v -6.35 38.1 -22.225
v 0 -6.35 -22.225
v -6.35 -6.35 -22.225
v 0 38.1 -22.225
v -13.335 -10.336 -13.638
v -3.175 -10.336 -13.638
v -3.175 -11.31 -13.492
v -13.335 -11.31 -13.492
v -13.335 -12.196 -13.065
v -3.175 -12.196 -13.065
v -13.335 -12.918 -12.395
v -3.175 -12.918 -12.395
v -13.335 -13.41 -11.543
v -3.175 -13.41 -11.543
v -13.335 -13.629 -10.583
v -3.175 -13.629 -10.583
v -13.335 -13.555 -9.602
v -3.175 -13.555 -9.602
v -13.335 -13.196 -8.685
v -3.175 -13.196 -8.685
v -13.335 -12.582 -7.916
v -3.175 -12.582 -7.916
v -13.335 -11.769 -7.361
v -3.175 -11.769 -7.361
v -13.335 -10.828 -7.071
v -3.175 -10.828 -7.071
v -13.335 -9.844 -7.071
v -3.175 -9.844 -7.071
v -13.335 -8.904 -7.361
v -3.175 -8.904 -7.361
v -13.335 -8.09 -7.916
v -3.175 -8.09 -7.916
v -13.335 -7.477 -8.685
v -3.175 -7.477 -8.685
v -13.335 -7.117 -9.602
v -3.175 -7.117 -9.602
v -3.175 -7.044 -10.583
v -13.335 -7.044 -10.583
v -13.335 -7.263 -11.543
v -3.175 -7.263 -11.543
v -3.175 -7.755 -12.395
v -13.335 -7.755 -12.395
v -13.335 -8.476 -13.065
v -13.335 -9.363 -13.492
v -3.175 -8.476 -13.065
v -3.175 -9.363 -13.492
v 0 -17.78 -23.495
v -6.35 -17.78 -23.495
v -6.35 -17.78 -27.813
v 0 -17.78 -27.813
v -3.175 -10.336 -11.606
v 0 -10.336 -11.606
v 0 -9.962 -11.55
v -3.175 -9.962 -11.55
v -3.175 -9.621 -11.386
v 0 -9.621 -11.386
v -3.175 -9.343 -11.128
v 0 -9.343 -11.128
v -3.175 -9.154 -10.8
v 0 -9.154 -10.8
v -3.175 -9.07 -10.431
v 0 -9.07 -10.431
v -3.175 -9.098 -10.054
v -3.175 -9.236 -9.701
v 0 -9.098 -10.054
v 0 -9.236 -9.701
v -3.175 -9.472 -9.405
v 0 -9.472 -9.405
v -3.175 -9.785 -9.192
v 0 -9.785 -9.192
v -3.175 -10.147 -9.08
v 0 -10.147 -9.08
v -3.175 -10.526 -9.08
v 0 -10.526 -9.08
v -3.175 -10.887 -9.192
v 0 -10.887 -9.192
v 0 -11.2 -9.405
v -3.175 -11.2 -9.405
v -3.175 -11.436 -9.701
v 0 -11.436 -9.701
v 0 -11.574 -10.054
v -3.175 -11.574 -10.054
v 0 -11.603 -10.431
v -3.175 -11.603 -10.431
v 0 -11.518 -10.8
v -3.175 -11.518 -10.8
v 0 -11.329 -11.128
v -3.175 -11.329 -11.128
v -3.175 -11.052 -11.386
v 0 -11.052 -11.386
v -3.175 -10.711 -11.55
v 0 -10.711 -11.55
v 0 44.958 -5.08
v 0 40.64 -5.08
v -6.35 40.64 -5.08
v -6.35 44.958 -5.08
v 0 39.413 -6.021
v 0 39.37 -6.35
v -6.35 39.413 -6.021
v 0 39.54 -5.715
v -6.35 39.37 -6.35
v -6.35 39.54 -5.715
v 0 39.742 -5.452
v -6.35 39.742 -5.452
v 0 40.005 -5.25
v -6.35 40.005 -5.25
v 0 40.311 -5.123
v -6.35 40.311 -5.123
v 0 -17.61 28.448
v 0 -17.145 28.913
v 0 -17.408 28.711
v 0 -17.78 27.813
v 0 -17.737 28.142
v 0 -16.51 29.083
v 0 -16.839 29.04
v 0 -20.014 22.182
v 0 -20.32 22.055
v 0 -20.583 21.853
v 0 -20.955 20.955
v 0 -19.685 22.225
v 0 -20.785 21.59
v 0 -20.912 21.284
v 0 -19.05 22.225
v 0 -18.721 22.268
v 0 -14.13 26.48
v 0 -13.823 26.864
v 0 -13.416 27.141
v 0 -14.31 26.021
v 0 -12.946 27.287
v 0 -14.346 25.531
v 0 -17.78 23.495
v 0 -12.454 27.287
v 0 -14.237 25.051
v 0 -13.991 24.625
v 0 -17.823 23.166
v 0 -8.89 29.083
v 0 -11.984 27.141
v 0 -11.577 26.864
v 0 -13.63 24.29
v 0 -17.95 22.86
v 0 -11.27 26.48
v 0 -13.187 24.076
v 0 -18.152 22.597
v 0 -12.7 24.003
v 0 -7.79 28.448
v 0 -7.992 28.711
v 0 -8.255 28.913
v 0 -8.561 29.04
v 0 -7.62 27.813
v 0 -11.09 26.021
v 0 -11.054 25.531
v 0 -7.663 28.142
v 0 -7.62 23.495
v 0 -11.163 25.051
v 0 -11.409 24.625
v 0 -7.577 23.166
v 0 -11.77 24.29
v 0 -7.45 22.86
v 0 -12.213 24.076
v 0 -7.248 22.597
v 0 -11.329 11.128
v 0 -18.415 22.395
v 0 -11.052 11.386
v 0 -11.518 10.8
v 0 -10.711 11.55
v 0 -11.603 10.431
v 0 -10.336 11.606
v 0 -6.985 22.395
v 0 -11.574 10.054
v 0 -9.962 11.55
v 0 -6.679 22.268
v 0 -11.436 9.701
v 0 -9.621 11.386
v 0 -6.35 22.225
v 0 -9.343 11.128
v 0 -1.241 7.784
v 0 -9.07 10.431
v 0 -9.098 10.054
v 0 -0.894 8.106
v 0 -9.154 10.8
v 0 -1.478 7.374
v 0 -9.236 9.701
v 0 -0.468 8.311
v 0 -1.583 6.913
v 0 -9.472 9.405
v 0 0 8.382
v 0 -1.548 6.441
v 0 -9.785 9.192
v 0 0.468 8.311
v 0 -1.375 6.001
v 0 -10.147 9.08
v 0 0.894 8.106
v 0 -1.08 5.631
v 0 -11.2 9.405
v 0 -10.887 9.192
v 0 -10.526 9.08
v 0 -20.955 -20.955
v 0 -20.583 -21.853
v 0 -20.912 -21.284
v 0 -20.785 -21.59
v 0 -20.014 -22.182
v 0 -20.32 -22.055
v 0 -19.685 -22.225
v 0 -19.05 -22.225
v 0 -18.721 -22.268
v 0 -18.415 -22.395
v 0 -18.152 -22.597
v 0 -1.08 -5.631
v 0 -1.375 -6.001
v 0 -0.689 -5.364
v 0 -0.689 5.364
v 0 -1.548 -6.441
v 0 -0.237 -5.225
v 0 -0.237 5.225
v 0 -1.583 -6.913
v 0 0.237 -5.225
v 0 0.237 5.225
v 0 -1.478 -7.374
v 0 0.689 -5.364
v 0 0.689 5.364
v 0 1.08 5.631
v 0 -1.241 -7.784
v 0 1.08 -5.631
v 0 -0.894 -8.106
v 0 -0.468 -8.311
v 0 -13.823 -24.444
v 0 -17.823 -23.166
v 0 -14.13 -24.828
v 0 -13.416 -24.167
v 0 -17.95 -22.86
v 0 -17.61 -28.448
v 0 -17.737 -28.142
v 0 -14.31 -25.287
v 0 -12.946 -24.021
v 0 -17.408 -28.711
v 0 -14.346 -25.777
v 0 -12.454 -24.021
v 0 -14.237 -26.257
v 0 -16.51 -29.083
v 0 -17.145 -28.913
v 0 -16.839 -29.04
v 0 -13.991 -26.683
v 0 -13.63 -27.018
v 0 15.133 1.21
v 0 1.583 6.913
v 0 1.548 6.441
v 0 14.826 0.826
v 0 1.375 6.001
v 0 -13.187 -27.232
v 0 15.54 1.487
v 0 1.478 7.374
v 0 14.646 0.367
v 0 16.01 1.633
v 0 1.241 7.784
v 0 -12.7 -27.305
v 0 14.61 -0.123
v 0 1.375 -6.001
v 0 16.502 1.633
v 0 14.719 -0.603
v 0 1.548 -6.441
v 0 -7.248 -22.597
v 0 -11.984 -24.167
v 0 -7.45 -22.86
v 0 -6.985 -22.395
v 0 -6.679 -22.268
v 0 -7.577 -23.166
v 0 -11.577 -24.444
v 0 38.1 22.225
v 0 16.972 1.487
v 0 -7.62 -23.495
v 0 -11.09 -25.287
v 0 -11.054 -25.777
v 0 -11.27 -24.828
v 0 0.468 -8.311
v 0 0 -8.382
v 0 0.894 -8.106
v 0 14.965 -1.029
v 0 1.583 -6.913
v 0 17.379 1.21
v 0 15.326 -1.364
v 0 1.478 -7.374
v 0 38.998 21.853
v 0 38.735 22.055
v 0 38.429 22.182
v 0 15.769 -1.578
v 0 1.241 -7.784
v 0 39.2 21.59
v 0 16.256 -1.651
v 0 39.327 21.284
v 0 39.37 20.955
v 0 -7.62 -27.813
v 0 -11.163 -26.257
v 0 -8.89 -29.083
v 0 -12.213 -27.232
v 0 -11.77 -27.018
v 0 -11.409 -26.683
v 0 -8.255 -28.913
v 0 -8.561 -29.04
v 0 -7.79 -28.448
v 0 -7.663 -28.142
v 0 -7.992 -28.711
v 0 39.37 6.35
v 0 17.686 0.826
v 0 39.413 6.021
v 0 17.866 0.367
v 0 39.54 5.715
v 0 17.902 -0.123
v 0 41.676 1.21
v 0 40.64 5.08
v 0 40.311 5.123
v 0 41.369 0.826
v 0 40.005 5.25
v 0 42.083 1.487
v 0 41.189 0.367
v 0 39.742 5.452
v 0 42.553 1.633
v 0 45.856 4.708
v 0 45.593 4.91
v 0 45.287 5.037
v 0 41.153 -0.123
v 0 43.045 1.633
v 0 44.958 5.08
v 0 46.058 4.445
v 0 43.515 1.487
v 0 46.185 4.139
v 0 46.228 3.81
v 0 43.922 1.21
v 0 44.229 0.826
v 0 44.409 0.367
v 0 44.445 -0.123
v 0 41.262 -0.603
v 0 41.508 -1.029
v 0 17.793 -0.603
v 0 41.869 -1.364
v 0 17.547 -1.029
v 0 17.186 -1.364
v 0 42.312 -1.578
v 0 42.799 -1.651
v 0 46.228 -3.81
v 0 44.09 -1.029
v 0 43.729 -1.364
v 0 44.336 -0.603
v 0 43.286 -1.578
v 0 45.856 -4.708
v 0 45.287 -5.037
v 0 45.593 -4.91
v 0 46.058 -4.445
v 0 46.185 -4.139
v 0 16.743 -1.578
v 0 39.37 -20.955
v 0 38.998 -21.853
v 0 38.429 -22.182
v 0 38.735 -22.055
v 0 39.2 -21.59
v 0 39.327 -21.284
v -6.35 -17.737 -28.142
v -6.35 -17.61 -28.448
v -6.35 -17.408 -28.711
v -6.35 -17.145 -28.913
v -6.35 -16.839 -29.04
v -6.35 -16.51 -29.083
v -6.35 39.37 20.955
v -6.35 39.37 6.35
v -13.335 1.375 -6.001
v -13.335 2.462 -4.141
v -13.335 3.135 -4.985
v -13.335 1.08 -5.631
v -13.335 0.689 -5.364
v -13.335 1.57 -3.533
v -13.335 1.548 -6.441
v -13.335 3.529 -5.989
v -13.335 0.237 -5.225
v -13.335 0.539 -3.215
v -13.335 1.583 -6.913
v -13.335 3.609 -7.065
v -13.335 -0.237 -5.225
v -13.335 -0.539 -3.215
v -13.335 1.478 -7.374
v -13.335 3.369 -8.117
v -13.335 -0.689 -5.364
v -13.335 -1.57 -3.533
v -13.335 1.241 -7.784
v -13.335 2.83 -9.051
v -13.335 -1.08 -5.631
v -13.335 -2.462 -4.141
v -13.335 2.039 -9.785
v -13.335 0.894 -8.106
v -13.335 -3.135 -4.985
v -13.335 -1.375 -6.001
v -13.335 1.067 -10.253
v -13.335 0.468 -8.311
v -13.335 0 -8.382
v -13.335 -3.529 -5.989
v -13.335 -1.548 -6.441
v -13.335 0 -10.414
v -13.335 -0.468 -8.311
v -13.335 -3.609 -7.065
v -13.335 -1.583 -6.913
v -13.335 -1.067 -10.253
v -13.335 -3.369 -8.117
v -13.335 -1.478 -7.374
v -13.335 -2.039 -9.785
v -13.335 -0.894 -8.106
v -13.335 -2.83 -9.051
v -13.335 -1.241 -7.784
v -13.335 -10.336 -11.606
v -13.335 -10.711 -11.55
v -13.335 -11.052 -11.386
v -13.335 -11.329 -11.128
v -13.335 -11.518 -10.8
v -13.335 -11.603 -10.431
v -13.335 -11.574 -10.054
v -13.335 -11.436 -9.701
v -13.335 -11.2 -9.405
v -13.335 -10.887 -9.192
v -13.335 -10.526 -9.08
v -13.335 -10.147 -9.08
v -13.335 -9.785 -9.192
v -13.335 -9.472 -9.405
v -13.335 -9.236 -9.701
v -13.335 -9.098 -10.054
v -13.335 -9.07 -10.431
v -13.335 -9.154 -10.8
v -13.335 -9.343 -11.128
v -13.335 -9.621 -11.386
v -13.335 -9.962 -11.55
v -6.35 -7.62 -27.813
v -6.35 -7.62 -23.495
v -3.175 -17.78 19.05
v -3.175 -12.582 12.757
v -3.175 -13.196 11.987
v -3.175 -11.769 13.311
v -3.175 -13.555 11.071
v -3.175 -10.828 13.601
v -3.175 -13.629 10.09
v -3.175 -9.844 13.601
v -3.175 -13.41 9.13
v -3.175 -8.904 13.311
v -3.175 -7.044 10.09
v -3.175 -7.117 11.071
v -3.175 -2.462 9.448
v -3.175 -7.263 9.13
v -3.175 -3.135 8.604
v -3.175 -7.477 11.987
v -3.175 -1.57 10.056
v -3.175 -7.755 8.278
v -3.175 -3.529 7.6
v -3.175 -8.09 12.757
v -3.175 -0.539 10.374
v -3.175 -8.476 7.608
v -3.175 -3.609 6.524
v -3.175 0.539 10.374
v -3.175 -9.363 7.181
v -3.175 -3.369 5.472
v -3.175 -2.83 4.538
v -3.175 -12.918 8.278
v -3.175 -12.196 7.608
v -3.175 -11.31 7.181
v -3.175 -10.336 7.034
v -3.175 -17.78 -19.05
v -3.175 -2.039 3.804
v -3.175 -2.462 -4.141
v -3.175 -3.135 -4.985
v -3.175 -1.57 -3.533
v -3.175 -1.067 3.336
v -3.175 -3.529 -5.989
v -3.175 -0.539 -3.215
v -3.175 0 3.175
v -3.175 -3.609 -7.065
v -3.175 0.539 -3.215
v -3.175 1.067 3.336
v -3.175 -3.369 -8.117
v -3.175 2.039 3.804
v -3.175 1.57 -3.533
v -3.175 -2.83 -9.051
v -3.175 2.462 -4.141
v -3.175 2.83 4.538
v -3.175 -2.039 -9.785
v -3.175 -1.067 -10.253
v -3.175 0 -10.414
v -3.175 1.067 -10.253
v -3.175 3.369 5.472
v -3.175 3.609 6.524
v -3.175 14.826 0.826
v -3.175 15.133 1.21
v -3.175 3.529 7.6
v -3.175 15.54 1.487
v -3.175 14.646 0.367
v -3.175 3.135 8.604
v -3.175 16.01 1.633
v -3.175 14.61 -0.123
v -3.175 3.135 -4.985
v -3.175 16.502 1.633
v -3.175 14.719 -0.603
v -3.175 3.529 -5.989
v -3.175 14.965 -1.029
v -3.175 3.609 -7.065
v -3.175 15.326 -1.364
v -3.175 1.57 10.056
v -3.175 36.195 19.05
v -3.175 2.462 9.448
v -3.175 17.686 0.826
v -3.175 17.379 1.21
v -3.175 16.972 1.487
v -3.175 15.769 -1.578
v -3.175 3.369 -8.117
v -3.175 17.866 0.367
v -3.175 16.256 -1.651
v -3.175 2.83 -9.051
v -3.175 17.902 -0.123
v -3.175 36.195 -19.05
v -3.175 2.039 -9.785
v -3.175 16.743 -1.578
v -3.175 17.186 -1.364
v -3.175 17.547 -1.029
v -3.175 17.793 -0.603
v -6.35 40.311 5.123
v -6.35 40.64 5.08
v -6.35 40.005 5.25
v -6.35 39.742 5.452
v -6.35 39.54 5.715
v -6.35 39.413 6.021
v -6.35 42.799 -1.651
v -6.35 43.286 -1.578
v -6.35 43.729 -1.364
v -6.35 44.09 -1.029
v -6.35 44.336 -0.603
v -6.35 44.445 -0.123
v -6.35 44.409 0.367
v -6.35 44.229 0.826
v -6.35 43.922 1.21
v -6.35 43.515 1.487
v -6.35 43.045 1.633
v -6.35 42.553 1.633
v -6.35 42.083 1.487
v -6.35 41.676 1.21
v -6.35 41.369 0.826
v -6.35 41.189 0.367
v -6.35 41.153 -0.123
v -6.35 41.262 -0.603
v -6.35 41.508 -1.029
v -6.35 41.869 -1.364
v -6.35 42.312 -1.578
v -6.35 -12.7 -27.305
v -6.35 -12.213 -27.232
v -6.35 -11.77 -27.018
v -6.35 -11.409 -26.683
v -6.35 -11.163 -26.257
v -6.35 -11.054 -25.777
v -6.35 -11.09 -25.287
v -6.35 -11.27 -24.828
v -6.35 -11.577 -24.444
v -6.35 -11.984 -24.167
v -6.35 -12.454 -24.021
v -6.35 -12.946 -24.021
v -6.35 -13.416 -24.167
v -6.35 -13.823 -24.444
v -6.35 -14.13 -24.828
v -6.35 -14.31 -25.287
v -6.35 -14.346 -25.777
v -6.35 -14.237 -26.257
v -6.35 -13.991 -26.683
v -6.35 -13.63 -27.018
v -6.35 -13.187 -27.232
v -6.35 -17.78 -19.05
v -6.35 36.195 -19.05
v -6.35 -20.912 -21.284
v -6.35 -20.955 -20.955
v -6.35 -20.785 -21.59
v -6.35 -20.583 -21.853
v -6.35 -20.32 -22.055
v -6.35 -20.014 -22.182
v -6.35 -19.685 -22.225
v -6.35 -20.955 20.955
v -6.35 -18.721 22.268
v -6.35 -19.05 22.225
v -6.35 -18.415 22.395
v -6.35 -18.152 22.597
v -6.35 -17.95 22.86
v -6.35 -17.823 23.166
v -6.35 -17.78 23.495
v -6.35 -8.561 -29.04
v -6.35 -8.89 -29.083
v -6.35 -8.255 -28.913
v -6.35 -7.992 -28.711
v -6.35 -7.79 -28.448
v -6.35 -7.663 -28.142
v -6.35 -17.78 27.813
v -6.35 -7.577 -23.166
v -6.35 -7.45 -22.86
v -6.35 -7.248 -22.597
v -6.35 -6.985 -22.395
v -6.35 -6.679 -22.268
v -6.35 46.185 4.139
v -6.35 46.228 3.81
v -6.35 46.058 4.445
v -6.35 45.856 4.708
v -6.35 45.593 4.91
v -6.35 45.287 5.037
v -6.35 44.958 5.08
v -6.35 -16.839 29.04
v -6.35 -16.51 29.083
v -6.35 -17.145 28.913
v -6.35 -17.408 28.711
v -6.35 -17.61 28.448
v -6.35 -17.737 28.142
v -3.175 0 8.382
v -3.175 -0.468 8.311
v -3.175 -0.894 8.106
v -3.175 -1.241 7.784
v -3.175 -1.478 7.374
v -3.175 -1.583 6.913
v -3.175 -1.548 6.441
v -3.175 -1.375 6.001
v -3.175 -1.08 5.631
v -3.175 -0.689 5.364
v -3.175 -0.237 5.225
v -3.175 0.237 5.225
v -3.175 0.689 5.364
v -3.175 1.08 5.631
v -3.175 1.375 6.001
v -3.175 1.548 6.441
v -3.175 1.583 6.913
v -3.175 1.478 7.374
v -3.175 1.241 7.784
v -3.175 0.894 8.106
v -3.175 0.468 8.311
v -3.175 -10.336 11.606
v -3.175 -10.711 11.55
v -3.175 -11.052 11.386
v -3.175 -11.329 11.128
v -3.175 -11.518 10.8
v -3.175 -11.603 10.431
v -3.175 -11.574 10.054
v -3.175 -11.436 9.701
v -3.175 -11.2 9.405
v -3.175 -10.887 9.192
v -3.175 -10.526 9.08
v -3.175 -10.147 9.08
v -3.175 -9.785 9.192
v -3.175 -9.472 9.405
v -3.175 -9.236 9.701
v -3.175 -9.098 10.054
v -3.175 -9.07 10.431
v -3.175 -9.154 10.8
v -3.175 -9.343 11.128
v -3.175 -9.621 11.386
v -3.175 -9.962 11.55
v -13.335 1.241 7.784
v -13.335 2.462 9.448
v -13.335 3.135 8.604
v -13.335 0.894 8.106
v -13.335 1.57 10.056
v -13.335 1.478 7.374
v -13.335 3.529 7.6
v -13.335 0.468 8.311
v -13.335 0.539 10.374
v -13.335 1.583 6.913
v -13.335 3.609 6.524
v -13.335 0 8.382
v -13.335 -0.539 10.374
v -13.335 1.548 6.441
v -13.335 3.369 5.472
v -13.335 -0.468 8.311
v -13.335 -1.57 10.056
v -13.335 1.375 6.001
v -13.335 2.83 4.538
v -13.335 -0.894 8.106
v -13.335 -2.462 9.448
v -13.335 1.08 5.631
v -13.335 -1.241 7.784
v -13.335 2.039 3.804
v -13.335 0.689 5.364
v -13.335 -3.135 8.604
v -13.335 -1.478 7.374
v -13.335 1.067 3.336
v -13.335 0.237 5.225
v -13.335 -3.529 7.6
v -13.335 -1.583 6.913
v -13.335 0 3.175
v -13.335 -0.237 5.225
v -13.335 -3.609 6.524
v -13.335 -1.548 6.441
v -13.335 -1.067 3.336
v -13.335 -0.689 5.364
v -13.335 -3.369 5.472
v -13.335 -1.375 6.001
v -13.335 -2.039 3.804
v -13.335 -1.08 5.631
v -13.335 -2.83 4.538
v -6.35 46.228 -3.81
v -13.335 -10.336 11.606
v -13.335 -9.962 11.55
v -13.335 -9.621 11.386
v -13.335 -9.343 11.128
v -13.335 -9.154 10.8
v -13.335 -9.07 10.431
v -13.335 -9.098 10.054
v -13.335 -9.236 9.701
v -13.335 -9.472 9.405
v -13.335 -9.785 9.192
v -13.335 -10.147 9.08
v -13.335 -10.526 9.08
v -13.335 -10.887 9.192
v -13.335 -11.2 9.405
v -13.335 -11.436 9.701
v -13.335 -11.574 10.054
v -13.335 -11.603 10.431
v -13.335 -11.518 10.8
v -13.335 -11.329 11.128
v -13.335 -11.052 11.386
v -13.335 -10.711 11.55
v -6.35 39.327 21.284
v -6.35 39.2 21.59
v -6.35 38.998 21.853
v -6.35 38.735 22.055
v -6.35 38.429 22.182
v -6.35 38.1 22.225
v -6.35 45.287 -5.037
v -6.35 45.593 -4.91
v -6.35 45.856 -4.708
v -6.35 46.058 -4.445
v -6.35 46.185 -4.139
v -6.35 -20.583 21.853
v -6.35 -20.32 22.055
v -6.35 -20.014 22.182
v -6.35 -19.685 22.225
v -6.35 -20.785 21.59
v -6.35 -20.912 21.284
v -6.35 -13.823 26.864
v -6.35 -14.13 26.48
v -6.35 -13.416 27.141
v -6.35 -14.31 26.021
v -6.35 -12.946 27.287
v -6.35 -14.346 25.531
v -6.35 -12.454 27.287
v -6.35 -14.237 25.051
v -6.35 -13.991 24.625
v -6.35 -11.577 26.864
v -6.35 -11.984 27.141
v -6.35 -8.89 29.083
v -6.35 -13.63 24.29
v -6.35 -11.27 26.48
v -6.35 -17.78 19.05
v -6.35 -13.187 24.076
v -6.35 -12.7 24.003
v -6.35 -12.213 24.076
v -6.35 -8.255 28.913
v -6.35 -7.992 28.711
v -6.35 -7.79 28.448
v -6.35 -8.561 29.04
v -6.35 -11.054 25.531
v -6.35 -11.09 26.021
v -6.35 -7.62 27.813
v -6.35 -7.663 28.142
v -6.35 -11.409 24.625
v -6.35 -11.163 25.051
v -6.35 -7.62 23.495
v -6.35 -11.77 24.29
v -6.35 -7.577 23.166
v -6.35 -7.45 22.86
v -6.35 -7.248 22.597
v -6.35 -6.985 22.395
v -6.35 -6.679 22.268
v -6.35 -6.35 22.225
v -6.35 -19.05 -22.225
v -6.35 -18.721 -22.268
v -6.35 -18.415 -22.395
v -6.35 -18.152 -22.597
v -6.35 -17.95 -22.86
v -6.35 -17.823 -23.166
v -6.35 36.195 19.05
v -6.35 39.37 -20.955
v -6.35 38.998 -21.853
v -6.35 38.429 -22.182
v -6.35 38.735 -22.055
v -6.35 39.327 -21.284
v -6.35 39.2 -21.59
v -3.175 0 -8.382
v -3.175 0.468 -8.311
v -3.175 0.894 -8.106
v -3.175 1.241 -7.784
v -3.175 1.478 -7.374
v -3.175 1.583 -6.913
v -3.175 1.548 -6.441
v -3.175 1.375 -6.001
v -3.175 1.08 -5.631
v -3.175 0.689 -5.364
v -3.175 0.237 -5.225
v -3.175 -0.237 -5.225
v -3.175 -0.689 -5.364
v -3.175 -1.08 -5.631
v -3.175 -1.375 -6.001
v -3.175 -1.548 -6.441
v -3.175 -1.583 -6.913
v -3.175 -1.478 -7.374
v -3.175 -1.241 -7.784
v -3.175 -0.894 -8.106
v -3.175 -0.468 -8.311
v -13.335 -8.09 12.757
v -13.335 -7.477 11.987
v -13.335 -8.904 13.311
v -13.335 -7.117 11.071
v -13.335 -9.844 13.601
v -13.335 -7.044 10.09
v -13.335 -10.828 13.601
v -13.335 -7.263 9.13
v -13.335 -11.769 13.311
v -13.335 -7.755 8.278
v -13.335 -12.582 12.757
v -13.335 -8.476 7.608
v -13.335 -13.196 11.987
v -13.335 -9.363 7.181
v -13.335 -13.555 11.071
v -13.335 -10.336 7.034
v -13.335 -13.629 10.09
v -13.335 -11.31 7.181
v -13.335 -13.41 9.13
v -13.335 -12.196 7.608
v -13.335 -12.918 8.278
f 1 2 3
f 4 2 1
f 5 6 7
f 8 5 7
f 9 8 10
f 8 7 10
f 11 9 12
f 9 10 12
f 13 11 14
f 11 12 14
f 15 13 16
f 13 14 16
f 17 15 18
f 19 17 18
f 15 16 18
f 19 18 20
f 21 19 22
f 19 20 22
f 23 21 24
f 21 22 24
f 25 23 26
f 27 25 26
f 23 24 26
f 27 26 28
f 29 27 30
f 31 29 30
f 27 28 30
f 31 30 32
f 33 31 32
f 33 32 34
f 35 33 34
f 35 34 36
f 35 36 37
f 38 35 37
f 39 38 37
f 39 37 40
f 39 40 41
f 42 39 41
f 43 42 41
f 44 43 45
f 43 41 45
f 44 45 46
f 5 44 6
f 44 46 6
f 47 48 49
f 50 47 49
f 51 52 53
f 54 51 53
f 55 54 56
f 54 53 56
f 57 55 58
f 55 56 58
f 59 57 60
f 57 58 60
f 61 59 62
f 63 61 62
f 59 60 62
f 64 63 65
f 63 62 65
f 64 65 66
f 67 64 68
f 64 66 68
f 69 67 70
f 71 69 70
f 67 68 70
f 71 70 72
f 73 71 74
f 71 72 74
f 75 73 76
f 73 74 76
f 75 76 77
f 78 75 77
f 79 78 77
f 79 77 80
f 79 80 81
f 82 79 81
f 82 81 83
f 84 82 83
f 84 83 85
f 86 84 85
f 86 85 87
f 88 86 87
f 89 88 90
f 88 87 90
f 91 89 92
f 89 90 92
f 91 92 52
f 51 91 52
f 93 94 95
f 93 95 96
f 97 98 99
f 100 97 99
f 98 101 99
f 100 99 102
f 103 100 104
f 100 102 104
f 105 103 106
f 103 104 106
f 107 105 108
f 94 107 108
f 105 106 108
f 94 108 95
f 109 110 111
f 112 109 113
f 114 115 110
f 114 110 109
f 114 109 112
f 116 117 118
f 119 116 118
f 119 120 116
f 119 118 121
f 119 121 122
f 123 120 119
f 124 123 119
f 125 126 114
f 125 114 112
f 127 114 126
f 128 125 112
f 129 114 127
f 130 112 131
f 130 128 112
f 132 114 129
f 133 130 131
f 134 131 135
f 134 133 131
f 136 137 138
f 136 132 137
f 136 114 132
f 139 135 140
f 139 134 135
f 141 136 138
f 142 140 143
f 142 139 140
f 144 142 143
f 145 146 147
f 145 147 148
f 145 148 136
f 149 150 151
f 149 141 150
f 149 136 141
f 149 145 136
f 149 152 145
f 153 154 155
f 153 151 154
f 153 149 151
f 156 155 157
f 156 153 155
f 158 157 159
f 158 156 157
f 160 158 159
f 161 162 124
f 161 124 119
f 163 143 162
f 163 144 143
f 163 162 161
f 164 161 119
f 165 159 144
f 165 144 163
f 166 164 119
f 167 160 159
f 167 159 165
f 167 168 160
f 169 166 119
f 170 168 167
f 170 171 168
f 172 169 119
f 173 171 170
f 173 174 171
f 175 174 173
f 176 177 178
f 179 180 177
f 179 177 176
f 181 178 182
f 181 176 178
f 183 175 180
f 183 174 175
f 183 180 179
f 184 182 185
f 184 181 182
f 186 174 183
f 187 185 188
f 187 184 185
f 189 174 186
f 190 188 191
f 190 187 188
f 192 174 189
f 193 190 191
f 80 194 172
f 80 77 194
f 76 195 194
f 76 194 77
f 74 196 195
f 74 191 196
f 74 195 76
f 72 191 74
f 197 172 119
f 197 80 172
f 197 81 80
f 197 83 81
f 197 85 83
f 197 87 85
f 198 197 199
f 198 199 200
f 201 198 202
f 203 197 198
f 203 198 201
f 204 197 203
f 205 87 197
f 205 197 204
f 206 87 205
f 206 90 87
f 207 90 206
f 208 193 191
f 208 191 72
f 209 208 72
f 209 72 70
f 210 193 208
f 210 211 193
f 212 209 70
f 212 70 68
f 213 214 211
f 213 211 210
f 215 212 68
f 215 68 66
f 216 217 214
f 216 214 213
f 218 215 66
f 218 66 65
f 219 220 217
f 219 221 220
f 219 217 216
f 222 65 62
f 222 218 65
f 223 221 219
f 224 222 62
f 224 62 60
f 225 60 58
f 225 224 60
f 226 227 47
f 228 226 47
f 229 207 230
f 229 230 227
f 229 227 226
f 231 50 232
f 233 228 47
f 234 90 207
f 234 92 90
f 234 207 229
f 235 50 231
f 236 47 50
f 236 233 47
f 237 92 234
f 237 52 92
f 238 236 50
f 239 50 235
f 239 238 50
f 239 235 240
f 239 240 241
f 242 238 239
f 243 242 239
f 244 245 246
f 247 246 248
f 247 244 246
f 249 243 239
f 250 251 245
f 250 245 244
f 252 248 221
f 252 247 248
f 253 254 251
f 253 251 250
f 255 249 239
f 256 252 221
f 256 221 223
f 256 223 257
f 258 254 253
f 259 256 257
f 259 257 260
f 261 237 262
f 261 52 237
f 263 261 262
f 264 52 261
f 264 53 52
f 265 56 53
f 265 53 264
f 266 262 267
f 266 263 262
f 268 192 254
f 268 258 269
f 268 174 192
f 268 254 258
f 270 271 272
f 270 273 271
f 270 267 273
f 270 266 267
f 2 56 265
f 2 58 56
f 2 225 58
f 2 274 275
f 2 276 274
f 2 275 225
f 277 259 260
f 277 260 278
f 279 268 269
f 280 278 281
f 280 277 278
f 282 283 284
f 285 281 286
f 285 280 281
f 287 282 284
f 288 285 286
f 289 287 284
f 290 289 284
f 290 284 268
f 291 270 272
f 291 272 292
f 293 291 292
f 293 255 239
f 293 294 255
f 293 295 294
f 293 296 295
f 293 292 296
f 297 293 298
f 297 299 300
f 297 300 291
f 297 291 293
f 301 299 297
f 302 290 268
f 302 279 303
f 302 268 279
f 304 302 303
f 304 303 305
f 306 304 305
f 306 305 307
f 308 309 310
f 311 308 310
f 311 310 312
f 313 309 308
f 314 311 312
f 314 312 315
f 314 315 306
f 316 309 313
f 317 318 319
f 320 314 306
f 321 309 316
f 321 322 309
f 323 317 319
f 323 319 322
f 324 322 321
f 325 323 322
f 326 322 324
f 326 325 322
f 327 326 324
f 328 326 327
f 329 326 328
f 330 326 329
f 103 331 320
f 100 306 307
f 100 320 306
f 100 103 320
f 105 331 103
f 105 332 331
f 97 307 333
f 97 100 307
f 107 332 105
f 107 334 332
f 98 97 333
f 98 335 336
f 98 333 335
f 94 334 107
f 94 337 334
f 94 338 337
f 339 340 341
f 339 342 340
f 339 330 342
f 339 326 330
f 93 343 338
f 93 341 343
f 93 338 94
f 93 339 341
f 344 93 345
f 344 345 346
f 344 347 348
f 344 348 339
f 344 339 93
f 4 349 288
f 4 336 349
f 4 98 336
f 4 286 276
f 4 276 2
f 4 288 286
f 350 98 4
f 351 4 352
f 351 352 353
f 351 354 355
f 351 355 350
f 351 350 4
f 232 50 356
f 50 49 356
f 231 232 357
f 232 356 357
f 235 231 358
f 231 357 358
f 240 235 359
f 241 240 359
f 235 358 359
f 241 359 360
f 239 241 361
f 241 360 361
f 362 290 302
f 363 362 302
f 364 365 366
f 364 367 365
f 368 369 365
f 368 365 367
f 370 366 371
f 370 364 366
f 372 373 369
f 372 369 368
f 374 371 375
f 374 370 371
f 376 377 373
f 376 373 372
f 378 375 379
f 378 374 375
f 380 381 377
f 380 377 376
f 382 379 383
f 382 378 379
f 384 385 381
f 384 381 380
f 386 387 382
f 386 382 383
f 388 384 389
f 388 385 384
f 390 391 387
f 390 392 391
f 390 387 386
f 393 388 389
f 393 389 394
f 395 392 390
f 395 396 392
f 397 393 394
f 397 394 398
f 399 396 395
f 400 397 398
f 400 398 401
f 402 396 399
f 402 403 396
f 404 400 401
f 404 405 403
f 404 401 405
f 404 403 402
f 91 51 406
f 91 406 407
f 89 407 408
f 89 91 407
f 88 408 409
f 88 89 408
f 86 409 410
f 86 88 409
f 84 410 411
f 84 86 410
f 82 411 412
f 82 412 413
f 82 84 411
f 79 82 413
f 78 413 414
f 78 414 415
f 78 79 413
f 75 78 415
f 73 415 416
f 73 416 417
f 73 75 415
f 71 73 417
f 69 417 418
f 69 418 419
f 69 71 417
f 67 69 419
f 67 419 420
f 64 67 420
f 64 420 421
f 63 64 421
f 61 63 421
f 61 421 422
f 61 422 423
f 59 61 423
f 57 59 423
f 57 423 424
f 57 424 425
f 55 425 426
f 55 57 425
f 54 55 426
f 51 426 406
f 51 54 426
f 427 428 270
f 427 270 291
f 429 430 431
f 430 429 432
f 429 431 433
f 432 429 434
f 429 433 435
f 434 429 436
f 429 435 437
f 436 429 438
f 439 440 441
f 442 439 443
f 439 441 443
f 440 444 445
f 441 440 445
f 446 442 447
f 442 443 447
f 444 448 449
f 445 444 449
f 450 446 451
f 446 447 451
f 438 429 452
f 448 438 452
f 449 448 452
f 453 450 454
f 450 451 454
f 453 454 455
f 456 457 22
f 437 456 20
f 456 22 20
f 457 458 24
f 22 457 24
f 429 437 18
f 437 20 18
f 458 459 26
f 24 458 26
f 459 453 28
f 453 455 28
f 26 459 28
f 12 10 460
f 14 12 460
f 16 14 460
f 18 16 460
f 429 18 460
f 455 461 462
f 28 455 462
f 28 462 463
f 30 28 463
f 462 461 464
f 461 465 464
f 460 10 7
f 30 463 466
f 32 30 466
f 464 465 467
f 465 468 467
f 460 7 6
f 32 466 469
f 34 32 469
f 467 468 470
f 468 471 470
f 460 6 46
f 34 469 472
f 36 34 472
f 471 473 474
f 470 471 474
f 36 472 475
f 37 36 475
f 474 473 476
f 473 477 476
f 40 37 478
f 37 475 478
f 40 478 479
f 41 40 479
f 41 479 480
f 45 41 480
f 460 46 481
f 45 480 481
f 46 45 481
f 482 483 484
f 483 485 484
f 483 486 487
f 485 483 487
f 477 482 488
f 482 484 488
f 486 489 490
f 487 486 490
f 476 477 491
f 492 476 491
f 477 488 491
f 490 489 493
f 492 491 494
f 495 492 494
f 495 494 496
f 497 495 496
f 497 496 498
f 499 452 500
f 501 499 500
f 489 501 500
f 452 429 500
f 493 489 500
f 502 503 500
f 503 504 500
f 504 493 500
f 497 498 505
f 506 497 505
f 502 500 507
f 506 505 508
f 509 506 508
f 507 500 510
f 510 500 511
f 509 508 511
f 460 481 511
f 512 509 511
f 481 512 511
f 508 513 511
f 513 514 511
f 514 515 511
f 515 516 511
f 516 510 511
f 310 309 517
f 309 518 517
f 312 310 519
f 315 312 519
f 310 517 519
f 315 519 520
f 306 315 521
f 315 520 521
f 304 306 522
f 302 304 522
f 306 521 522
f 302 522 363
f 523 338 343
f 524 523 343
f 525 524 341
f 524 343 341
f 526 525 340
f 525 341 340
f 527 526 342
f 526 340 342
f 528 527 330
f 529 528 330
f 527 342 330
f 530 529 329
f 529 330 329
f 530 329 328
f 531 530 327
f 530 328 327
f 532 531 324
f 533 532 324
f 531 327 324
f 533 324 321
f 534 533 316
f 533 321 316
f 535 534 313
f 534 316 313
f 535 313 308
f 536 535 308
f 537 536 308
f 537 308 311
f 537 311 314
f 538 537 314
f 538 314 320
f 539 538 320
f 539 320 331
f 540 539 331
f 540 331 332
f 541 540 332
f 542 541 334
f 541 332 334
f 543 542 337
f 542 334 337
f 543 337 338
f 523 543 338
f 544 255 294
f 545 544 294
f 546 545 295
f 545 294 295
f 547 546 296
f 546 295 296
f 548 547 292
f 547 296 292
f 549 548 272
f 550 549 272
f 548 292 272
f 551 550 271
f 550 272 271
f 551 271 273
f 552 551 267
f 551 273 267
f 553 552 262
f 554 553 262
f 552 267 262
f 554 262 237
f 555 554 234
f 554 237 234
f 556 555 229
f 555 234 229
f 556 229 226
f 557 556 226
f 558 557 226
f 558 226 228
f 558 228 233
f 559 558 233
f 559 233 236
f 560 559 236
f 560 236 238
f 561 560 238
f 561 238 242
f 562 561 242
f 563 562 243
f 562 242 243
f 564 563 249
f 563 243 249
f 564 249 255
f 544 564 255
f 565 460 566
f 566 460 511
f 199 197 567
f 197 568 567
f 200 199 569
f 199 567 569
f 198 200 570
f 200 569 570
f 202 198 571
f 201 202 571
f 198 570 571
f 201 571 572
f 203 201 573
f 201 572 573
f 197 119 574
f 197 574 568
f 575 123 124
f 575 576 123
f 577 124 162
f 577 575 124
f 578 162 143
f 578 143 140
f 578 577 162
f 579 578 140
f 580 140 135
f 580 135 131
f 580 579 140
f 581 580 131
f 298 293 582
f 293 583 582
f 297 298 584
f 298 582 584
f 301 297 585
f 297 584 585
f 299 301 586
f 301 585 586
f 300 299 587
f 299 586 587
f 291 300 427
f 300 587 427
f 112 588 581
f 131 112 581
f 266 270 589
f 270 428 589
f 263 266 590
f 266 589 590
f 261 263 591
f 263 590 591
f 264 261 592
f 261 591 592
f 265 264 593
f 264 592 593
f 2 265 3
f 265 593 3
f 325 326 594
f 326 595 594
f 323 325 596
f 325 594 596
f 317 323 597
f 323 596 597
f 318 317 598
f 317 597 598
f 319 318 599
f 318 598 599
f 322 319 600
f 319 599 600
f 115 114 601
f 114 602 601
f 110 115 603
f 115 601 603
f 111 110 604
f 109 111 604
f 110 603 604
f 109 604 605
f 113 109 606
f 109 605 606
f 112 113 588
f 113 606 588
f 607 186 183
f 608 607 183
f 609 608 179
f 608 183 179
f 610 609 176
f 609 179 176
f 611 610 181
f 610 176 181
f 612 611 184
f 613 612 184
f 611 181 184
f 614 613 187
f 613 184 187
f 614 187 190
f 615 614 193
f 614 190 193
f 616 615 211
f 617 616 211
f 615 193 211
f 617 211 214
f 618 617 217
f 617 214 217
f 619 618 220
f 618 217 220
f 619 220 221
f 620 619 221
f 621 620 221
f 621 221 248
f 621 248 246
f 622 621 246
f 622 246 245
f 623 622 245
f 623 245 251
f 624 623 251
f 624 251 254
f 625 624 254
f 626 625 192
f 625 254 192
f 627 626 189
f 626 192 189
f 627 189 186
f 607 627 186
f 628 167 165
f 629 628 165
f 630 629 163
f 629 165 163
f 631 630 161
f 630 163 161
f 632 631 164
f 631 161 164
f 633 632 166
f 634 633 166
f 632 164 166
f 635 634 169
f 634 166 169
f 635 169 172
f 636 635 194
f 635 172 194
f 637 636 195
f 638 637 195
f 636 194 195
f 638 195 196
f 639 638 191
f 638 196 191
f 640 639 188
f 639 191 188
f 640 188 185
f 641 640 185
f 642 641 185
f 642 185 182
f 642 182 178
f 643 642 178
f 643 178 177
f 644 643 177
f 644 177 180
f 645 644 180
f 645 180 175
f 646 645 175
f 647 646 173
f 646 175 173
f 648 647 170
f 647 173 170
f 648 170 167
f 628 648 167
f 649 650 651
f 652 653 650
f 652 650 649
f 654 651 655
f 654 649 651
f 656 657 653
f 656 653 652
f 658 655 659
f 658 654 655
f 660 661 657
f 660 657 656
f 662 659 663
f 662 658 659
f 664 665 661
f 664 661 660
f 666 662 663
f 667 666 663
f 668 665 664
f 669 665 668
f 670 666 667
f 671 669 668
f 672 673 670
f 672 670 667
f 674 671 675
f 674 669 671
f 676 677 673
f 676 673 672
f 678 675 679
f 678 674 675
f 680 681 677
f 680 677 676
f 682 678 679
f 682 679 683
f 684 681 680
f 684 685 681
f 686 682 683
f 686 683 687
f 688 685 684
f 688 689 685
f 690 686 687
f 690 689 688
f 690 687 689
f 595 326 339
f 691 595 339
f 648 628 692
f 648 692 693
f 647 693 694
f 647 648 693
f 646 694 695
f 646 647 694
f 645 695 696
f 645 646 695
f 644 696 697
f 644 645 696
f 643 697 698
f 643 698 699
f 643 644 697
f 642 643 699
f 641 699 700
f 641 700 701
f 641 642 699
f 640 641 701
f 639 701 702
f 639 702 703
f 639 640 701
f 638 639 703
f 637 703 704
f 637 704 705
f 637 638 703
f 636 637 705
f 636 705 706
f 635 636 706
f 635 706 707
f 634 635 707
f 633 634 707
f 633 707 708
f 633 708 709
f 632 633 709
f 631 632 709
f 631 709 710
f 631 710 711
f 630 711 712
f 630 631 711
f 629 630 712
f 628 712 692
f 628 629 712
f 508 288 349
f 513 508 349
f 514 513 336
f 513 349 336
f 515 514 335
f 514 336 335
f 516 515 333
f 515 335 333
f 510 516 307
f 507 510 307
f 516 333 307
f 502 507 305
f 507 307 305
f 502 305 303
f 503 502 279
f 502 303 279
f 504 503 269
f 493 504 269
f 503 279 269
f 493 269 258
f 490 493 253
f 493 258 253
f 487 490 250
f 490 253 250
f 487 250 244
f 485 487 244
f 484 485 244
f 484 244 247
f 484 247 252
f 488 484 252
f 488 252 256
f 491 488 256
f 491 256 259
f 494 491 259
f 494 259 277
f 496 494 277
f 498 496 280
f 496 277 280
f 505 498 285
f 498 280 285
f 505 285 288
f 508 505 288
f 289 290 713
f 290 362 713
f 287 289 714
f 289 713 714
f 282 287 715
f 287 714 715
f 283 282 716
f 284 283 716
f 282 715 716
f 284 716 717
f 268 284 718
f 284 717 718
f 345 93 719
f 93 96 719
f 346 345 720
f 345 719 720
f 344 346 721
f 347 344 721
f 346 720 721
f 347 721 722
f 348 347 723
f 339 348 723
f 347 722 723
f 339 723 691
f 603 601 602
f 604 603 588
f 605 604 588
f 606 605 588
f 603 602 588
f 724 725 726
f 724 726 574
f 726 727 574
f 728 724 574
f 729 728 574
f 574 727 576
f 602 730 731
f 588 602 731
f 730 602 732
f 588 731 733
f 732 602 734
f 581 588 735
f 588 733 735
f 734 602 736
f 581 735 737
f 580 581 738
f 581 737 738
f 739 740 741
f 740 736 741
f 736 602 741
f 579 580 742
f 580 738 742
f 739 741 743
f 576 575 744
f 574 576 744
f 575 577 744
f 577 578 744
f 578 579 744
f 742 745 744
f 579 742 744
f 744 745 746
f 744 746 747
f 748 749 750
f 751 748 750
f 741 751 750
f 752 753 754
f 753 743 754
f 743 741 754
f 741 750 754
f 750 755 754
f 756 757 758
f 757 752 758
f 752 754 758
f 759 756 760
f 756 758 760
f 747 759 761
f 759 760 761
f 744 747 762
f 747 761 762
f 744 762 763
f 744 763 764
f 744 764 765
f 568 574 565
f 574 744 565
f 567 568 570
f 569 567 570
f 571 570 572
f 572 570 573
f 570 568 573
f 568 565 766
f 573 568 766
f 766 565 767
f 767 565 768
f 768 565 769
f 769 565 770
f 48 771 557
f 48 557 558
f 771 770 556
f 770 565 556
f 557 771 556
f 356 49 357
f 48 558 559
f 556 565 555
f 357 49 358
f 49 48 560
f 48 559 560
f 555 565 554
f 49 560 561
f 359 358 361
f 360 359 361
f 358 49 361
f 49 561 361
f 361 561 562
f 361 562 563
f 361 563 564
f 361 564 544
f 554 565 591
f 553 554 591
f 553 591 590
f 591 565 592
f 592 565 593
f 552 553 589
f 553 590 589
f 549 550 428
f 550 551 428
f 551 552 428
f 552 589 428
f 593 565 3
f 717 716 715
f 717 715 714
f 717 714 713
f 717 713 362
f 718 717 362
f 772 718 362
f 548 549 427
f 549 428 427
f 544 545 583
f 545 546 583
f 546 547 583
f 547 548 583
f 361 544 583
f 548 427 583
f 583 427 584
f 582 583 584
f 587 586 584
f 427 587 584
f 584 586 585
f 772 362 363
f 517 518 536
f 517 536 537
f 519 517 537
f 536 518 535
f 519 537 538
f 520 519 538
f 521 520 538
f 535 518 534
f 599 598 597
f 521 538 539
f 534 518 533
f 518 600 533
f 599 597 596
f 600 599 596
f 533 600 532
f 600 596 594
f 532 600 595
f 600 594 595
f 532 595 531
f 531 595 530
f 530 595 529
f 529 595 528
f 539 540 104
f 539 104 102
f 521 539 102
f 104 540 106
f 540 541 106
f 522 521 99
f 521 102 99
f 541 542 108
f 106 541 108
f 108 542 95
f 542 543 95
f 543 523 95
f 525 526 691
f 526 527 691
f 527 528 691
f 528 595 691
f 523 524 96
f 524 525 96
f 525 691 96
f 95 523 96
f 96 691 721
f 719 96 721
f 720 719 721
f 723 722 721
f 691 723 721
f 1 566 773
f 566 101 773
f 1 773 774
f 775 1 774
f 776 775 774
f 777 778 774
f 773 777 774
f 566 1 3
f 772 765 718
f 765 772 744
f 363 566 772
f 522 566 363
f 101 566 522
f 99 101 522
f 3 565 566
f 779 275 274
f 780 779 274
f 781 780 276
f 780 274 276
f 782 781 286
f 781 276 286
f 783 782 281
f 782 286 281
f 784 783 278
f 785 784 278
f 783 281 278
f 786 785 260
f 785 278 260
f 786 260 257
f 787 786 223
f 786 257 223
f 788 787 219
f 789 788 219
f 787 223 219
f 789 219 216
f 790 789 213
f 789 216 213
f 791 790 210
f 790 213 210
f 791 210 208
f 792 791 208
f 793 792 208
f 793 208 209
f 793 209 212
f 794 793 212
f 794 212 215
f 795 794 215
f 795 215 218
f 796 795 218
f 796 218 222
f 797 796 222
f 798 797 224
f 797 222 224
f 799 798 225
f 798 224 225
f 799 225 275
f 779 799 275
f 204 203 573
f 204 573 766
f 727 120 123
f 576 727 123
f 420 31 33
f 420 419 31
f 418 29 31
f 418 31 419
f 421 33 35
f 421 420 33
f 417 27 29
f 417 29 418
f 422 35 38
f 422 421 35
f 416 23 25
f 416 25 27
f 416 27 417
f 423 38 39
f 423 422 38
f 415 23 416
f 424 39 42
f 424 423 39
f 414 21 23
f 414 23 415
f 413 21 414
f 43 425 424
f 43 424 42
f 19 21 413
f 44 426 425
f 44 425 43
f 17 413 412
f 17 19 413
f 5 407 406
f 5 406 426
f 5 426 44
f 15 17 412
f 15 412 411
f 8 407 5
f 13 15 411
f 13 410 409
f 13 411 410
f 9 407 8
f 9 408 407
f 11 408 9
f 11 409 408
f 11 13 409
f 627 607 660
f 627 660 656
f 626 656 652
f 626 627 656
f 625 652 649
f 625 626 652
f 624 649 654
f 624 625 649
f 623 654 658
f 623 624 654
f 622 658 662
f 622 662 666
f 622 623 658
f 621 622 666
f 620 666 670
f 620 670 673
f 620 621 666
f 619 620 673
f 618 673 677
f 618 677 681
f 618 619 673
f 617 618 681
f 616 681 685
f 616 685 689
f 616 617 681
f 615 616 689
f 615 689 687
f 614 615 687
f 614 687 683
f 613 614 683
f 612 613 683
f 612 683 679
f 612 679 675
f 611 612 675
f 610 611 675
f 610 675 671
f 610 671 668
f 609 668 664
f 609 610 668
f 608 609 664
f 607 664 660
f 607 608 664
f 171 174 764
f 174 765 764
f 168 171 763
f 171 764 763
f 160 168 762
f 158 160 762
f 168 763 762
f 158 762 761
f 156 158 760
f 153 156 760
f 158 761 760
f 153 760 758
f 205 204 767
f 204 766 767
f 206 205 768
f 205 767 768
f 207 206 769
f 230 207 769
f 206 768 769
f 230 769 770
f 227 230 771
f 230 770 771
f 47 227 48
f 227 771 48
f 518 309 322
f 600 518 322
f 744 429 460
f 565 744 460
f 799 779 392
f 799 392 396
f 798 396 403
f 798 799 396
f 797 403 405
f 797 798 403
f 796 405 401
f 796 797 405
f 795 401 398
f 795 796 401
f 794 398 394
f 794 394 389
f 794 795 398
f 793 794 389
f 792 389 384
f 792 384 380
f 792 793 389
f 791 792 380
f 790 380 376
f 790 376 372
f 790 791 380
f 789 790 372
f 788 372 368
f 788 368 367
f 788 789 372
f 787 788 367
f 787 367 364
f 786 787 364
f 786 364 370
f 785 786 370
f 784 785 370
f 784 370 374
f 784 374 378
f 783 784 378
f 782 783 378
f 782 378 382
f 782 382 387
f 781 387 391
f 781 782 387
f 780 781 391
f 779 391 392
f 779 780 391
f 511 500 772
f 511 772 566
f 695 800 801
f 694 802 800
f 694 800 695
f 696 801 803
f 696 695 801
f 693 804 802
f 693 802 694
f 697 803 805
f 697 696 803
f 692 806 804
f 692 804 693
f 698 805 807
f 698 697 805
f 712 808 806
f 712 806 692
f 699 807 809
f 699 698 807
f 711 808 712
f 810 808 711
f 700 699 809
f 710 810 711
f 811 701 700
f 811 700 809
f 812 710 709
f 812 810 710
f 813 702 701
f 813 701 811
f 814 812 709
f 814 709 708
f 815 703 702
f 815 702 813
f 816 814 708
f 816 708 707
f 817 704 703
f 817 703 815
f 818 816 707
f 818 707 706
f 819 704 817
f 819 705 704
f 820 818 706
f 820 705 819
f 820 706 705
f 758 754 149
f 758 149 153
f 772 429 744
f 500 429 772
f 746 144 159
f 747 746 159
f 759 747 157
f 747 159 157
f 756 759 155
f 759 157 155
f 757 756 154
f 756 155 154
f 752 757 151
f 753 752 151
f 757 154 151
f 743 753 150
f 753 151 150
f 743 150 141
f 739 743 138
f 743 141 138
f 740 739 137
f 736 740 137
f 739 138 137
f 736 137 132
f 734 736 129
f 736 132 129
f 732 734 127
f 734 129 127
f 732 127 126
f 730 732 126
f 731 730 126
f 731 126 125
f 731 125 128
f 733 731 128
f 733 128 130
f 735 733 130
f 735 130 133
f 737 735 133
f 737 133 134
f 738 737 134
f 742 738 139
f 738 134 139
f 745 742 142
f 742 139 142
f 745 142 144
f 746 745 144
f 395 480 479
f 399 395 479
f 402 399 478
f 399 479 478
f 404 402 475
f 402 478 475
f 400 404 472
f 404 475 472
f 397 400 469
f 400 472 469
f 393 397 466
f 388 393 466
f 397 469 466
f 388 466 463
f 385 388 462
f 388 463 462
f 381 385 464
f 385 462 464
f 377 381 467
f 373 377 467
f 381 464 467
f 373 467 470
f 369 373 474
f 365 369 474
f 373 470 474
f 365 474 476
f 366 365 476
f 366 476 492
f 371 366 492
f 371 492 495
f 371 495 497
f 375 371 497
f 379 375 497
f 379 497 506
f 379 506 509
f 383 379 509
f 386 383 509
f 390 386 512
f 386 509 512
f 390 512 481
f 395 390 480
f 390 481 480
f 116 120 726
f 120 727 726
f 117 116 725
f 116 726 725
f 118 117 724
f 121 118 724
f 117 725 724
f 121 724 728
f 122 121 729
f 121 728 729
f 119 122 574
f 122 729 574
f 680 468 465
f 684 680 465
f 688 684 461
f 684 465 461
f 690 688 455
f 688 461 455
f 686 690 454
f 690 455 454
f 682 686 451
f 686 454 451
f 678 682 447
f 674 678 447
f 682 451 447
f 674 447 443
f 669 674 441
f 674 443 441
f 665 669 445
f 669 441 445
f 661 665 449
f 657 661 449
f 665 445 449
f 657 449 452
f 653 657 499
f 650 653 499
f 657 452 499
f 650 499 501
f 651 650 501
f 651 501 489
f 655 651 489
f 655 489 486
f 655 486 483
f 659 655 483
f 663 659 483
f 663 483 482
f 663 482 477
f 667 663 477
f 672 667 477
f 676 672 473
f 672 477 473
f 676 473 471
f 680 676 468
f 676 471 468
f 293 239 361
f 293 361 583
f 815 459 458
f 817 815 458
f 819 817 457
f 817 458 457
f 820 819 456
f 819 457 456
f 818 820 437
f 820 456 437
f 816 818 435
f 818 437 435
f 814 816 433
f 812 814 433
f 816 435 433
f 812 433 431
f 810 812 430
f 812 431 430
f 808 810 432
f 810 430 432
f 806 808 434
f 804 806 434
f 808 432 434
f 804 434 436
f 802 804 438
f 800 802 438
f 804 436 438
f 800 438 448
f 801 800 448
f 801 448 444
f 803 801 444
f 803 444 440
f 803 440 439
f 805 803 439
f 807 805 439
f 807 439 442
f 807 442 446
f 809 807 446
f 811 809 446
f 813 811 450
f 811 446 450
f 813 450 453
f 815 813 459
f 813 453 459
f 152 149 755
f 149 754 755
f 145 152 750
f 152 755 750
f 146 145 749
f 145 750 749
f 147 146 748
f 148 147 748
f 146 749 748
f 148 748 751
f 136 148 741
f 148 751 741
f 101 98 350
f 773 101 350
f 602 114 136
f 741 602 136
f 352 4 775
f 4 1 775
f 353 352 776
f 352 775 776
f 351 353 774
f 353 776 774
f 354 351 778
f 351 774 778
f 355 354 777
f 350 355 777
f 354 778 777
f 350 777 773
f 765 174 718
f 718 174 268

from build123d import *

# Parameters (mm, degrees)
SKETCH11_W          = 38.1
SKETCH11_H          = 53.975
SKETCH11_R          = 1.651
SKETCH11_R_2        = 1.5875
SKETCH11_R_3        = 1.27
BOSS_EXTRUDE1_DEPTH = 3.175
SKETCH12_W          = 44.45
SKETCH12_H          = 60.325
SKETCH12_W_2        = 38.1
SKETCH12_H_2        = 53.975
BOSS_EXTRUDE2_DEPTH = 6.35
SKETCH13_W          = 6.858
SKETCH13_H          = 10.16
SKETCH13_R          = 1.651
SKETCH13_W_2        = 10.16
SKETCH13_H_2        = 6.858
BOSS_EXTRUDE3_DEPTH = 6.35
SKETCH14_R          = 3.6195
SKETCH14_R_2        = 1.5875
SKETCH14_R_3        = 3.302
SKETCH14_R_4        = 1.27
BOSS_EXTRUDE4_DEPTH = 10.16
FILLET2_R           = 1.27


with BuildPart() as part:
    # Sketch11 → Boss-Extrude1 (new body)
    with BuildSketch(Plane(origin=(0, 0, 0), x_dir=(0, 0, -1), z_dir=(1, 0, 0))):
        with Locations((0, 9.2075)):
            Rectangle(SKETCH11_W, SKETCH11_H)
        with Locations((0, 16.256)):
            Circle(SKETCH11_R, mode=Mode.SUBTRACT)
        with Locations((6.7945, 0)):
            Circle(SKETCH11_R_2, mode=Mode.SUBTRACT)
        with Locations((10.336274795, -10.336274795)):
            Circle(SKETCH11_R_3, mode=Mode.SUBTRACT)
        with Locations(Location((-10.336274795, -10.336274795, 0), (0, 0, 180))):
            Circle(SKETCH11_R_3, mode=Mode.SUBTRACT)
        with Locations(Location((-6.7945, 0, 0), (0, 0, 180))):
            Circle(SKETCH11_R_2, mode=Mode.SUBTRACT)
    extrude(amount=-BOSS_EXTRUDE1_DEPTH)

    # Sketch12 → Boss-Extrude2 (add)
    with BuildSketch(Plane(origin=(0, 0, 0), x_dir=(0, 0, -1), z_dir=(1, 0, 0))):
        with Locations((0, 9.2075)):
            Rectangle(SKETCH12_W, SKETCH12_H)
        with Locations((0, 9.2075)):
            Rectangle(SKETCH12_W_2, SKETCH12_H_2, mode=Mode.SUBTRACT)
    extrude(amount=-BOSS_EXTRUDE2_DEPTH)

    # Sketch13 → Boss-Extrude3 (add)
    # profile 1 of 3: a face of its own
    with BuildSketch(Plane(origin=(0, 0, 0), x_dir=(0, 0, -1), z_dir=(1, 0, 0))):
        with Locations((-25.654, -12.7)):
            Rectangle(SKETCH13_W, SKETCH13_H)
        with Locations((-25.654, -12.7)):
            Circle(SKETCH13_R, mode=Mode.SUBTRACT)
    # profile 2 of 3: a face of its own
    with BuildSketch(Plane(origin=(0, 0, 0), x_dir=(0, 0, -1), z_dir=(1, 0, 0))):
        with Locations((0, 42.799)):
            Rectangle(SKETCH13_W_2, SKETCH13_H_2)
        with Locations((0, 42.799)):
            Circle(SKETCH13_R, mode=Mode.SUBTRACT)
    # profile 3 of 3: a face of its own
    with BuildSketch(Plane(origin=(0, 0, 0), x_dir=(0, 0, -1), z_dir=(1, 0, 0))):
        with Locations((25.654, -12.7)):
            Rectangle(SKETCH13_W, SKETCH13_H)
        with Locations((25.654, -12.7)):
            Circle(SKETCH13_R, mode=Mode.SUBTRACT)
    extrude(amount=-BOSS_EXTRUDE3_DEPTH)

    # Sketch14 → Boss-Extrude4 (add)
    # profile 1 of 4: a face of its own
    with BuildSketch(Plane.ZY.offset(3.175)):
        with Locations(Location((-6.7945, 0, 0), (0, 0, 180))):
            Circle(SKETCH14_R)
        with Locations(Location((-6.7945, 0, 0), (0, 0, 180))):
            Circle(SKETCH14_R_2, mode=Mode.SUBTRACT)
    # profile 2 of 4: a face of its own
    with BuildSketch(Plane.ZY.offset(3.175)):
        with Locations(Location((6.7945, 0, 0), (0, 0, 180))):
            Circle(SKETCH14_R)
        with Locations((6.7945, 0)):
            Circle(SKETCH14_R_2, mode=Mode.SUBTRACT)
    # profile 3 of 4: a face of its own
    with BuildSketch(Plane.ZY.offset(3.175)):
        with Locations(Location((-10.336274795, -10.336274795, 0), (0, 0, 180))):
            Circle(SKETCH14_R_3)
        with Locations(Location((-10.336274795, -10.336274795, 0), (0, 0, 180))):
            Circle(SKETCH14_R_4, mode=Mode.SUBTRACT)
    # profile 4 of 4: a face of its own
    with BuildSketch(Plane.ZY.offset(3.175)):
        with Locations(Location((10.336274795, -10.336274795, 0), (0, 0, 180))):
            Circle(SKETCH14_R_3)
        with Locations((10.336274795, -10.336274795)):
            Circle(SKETCH14_R_4, mode=Mode.SUBTRACT)
    extrude(amount=BOSS_EXTRUDE4_DEPTH)

    # Fillet2
    fillet2_edges = [part.edges().sort_by_distance(p)[0] for p in [
        (-3.175, 39.37, 22.225),
        (-3.175, 39.37, -22.225),
        (-3.175, -20.955, -22.225),
        (-3.175, -20.955, 22.225),
        (-3.175, -7.62, 29.083),
        (-3.175, -17.78, 29.083),
        (-3.175, -17.78, 22.225),
        (-3.175, -7.62, 22.225),
        (-3.175, 46.228, 5.08),
        (-3.175, 39.37, 5.08),
        (-3.175, 39.37, -5.08),
        (-3.175, 46.228, -5.08),
        (-3.175, -17.78, -29.083),
        (-3.175, -7.62, -29.083),
        (-3.175, -7.62, -22.225),
        (-3.175, -17.78, -22.225),
    ]]
    fillet(fillet2_edges, radius=FILLET2_R)


solid = part.part
